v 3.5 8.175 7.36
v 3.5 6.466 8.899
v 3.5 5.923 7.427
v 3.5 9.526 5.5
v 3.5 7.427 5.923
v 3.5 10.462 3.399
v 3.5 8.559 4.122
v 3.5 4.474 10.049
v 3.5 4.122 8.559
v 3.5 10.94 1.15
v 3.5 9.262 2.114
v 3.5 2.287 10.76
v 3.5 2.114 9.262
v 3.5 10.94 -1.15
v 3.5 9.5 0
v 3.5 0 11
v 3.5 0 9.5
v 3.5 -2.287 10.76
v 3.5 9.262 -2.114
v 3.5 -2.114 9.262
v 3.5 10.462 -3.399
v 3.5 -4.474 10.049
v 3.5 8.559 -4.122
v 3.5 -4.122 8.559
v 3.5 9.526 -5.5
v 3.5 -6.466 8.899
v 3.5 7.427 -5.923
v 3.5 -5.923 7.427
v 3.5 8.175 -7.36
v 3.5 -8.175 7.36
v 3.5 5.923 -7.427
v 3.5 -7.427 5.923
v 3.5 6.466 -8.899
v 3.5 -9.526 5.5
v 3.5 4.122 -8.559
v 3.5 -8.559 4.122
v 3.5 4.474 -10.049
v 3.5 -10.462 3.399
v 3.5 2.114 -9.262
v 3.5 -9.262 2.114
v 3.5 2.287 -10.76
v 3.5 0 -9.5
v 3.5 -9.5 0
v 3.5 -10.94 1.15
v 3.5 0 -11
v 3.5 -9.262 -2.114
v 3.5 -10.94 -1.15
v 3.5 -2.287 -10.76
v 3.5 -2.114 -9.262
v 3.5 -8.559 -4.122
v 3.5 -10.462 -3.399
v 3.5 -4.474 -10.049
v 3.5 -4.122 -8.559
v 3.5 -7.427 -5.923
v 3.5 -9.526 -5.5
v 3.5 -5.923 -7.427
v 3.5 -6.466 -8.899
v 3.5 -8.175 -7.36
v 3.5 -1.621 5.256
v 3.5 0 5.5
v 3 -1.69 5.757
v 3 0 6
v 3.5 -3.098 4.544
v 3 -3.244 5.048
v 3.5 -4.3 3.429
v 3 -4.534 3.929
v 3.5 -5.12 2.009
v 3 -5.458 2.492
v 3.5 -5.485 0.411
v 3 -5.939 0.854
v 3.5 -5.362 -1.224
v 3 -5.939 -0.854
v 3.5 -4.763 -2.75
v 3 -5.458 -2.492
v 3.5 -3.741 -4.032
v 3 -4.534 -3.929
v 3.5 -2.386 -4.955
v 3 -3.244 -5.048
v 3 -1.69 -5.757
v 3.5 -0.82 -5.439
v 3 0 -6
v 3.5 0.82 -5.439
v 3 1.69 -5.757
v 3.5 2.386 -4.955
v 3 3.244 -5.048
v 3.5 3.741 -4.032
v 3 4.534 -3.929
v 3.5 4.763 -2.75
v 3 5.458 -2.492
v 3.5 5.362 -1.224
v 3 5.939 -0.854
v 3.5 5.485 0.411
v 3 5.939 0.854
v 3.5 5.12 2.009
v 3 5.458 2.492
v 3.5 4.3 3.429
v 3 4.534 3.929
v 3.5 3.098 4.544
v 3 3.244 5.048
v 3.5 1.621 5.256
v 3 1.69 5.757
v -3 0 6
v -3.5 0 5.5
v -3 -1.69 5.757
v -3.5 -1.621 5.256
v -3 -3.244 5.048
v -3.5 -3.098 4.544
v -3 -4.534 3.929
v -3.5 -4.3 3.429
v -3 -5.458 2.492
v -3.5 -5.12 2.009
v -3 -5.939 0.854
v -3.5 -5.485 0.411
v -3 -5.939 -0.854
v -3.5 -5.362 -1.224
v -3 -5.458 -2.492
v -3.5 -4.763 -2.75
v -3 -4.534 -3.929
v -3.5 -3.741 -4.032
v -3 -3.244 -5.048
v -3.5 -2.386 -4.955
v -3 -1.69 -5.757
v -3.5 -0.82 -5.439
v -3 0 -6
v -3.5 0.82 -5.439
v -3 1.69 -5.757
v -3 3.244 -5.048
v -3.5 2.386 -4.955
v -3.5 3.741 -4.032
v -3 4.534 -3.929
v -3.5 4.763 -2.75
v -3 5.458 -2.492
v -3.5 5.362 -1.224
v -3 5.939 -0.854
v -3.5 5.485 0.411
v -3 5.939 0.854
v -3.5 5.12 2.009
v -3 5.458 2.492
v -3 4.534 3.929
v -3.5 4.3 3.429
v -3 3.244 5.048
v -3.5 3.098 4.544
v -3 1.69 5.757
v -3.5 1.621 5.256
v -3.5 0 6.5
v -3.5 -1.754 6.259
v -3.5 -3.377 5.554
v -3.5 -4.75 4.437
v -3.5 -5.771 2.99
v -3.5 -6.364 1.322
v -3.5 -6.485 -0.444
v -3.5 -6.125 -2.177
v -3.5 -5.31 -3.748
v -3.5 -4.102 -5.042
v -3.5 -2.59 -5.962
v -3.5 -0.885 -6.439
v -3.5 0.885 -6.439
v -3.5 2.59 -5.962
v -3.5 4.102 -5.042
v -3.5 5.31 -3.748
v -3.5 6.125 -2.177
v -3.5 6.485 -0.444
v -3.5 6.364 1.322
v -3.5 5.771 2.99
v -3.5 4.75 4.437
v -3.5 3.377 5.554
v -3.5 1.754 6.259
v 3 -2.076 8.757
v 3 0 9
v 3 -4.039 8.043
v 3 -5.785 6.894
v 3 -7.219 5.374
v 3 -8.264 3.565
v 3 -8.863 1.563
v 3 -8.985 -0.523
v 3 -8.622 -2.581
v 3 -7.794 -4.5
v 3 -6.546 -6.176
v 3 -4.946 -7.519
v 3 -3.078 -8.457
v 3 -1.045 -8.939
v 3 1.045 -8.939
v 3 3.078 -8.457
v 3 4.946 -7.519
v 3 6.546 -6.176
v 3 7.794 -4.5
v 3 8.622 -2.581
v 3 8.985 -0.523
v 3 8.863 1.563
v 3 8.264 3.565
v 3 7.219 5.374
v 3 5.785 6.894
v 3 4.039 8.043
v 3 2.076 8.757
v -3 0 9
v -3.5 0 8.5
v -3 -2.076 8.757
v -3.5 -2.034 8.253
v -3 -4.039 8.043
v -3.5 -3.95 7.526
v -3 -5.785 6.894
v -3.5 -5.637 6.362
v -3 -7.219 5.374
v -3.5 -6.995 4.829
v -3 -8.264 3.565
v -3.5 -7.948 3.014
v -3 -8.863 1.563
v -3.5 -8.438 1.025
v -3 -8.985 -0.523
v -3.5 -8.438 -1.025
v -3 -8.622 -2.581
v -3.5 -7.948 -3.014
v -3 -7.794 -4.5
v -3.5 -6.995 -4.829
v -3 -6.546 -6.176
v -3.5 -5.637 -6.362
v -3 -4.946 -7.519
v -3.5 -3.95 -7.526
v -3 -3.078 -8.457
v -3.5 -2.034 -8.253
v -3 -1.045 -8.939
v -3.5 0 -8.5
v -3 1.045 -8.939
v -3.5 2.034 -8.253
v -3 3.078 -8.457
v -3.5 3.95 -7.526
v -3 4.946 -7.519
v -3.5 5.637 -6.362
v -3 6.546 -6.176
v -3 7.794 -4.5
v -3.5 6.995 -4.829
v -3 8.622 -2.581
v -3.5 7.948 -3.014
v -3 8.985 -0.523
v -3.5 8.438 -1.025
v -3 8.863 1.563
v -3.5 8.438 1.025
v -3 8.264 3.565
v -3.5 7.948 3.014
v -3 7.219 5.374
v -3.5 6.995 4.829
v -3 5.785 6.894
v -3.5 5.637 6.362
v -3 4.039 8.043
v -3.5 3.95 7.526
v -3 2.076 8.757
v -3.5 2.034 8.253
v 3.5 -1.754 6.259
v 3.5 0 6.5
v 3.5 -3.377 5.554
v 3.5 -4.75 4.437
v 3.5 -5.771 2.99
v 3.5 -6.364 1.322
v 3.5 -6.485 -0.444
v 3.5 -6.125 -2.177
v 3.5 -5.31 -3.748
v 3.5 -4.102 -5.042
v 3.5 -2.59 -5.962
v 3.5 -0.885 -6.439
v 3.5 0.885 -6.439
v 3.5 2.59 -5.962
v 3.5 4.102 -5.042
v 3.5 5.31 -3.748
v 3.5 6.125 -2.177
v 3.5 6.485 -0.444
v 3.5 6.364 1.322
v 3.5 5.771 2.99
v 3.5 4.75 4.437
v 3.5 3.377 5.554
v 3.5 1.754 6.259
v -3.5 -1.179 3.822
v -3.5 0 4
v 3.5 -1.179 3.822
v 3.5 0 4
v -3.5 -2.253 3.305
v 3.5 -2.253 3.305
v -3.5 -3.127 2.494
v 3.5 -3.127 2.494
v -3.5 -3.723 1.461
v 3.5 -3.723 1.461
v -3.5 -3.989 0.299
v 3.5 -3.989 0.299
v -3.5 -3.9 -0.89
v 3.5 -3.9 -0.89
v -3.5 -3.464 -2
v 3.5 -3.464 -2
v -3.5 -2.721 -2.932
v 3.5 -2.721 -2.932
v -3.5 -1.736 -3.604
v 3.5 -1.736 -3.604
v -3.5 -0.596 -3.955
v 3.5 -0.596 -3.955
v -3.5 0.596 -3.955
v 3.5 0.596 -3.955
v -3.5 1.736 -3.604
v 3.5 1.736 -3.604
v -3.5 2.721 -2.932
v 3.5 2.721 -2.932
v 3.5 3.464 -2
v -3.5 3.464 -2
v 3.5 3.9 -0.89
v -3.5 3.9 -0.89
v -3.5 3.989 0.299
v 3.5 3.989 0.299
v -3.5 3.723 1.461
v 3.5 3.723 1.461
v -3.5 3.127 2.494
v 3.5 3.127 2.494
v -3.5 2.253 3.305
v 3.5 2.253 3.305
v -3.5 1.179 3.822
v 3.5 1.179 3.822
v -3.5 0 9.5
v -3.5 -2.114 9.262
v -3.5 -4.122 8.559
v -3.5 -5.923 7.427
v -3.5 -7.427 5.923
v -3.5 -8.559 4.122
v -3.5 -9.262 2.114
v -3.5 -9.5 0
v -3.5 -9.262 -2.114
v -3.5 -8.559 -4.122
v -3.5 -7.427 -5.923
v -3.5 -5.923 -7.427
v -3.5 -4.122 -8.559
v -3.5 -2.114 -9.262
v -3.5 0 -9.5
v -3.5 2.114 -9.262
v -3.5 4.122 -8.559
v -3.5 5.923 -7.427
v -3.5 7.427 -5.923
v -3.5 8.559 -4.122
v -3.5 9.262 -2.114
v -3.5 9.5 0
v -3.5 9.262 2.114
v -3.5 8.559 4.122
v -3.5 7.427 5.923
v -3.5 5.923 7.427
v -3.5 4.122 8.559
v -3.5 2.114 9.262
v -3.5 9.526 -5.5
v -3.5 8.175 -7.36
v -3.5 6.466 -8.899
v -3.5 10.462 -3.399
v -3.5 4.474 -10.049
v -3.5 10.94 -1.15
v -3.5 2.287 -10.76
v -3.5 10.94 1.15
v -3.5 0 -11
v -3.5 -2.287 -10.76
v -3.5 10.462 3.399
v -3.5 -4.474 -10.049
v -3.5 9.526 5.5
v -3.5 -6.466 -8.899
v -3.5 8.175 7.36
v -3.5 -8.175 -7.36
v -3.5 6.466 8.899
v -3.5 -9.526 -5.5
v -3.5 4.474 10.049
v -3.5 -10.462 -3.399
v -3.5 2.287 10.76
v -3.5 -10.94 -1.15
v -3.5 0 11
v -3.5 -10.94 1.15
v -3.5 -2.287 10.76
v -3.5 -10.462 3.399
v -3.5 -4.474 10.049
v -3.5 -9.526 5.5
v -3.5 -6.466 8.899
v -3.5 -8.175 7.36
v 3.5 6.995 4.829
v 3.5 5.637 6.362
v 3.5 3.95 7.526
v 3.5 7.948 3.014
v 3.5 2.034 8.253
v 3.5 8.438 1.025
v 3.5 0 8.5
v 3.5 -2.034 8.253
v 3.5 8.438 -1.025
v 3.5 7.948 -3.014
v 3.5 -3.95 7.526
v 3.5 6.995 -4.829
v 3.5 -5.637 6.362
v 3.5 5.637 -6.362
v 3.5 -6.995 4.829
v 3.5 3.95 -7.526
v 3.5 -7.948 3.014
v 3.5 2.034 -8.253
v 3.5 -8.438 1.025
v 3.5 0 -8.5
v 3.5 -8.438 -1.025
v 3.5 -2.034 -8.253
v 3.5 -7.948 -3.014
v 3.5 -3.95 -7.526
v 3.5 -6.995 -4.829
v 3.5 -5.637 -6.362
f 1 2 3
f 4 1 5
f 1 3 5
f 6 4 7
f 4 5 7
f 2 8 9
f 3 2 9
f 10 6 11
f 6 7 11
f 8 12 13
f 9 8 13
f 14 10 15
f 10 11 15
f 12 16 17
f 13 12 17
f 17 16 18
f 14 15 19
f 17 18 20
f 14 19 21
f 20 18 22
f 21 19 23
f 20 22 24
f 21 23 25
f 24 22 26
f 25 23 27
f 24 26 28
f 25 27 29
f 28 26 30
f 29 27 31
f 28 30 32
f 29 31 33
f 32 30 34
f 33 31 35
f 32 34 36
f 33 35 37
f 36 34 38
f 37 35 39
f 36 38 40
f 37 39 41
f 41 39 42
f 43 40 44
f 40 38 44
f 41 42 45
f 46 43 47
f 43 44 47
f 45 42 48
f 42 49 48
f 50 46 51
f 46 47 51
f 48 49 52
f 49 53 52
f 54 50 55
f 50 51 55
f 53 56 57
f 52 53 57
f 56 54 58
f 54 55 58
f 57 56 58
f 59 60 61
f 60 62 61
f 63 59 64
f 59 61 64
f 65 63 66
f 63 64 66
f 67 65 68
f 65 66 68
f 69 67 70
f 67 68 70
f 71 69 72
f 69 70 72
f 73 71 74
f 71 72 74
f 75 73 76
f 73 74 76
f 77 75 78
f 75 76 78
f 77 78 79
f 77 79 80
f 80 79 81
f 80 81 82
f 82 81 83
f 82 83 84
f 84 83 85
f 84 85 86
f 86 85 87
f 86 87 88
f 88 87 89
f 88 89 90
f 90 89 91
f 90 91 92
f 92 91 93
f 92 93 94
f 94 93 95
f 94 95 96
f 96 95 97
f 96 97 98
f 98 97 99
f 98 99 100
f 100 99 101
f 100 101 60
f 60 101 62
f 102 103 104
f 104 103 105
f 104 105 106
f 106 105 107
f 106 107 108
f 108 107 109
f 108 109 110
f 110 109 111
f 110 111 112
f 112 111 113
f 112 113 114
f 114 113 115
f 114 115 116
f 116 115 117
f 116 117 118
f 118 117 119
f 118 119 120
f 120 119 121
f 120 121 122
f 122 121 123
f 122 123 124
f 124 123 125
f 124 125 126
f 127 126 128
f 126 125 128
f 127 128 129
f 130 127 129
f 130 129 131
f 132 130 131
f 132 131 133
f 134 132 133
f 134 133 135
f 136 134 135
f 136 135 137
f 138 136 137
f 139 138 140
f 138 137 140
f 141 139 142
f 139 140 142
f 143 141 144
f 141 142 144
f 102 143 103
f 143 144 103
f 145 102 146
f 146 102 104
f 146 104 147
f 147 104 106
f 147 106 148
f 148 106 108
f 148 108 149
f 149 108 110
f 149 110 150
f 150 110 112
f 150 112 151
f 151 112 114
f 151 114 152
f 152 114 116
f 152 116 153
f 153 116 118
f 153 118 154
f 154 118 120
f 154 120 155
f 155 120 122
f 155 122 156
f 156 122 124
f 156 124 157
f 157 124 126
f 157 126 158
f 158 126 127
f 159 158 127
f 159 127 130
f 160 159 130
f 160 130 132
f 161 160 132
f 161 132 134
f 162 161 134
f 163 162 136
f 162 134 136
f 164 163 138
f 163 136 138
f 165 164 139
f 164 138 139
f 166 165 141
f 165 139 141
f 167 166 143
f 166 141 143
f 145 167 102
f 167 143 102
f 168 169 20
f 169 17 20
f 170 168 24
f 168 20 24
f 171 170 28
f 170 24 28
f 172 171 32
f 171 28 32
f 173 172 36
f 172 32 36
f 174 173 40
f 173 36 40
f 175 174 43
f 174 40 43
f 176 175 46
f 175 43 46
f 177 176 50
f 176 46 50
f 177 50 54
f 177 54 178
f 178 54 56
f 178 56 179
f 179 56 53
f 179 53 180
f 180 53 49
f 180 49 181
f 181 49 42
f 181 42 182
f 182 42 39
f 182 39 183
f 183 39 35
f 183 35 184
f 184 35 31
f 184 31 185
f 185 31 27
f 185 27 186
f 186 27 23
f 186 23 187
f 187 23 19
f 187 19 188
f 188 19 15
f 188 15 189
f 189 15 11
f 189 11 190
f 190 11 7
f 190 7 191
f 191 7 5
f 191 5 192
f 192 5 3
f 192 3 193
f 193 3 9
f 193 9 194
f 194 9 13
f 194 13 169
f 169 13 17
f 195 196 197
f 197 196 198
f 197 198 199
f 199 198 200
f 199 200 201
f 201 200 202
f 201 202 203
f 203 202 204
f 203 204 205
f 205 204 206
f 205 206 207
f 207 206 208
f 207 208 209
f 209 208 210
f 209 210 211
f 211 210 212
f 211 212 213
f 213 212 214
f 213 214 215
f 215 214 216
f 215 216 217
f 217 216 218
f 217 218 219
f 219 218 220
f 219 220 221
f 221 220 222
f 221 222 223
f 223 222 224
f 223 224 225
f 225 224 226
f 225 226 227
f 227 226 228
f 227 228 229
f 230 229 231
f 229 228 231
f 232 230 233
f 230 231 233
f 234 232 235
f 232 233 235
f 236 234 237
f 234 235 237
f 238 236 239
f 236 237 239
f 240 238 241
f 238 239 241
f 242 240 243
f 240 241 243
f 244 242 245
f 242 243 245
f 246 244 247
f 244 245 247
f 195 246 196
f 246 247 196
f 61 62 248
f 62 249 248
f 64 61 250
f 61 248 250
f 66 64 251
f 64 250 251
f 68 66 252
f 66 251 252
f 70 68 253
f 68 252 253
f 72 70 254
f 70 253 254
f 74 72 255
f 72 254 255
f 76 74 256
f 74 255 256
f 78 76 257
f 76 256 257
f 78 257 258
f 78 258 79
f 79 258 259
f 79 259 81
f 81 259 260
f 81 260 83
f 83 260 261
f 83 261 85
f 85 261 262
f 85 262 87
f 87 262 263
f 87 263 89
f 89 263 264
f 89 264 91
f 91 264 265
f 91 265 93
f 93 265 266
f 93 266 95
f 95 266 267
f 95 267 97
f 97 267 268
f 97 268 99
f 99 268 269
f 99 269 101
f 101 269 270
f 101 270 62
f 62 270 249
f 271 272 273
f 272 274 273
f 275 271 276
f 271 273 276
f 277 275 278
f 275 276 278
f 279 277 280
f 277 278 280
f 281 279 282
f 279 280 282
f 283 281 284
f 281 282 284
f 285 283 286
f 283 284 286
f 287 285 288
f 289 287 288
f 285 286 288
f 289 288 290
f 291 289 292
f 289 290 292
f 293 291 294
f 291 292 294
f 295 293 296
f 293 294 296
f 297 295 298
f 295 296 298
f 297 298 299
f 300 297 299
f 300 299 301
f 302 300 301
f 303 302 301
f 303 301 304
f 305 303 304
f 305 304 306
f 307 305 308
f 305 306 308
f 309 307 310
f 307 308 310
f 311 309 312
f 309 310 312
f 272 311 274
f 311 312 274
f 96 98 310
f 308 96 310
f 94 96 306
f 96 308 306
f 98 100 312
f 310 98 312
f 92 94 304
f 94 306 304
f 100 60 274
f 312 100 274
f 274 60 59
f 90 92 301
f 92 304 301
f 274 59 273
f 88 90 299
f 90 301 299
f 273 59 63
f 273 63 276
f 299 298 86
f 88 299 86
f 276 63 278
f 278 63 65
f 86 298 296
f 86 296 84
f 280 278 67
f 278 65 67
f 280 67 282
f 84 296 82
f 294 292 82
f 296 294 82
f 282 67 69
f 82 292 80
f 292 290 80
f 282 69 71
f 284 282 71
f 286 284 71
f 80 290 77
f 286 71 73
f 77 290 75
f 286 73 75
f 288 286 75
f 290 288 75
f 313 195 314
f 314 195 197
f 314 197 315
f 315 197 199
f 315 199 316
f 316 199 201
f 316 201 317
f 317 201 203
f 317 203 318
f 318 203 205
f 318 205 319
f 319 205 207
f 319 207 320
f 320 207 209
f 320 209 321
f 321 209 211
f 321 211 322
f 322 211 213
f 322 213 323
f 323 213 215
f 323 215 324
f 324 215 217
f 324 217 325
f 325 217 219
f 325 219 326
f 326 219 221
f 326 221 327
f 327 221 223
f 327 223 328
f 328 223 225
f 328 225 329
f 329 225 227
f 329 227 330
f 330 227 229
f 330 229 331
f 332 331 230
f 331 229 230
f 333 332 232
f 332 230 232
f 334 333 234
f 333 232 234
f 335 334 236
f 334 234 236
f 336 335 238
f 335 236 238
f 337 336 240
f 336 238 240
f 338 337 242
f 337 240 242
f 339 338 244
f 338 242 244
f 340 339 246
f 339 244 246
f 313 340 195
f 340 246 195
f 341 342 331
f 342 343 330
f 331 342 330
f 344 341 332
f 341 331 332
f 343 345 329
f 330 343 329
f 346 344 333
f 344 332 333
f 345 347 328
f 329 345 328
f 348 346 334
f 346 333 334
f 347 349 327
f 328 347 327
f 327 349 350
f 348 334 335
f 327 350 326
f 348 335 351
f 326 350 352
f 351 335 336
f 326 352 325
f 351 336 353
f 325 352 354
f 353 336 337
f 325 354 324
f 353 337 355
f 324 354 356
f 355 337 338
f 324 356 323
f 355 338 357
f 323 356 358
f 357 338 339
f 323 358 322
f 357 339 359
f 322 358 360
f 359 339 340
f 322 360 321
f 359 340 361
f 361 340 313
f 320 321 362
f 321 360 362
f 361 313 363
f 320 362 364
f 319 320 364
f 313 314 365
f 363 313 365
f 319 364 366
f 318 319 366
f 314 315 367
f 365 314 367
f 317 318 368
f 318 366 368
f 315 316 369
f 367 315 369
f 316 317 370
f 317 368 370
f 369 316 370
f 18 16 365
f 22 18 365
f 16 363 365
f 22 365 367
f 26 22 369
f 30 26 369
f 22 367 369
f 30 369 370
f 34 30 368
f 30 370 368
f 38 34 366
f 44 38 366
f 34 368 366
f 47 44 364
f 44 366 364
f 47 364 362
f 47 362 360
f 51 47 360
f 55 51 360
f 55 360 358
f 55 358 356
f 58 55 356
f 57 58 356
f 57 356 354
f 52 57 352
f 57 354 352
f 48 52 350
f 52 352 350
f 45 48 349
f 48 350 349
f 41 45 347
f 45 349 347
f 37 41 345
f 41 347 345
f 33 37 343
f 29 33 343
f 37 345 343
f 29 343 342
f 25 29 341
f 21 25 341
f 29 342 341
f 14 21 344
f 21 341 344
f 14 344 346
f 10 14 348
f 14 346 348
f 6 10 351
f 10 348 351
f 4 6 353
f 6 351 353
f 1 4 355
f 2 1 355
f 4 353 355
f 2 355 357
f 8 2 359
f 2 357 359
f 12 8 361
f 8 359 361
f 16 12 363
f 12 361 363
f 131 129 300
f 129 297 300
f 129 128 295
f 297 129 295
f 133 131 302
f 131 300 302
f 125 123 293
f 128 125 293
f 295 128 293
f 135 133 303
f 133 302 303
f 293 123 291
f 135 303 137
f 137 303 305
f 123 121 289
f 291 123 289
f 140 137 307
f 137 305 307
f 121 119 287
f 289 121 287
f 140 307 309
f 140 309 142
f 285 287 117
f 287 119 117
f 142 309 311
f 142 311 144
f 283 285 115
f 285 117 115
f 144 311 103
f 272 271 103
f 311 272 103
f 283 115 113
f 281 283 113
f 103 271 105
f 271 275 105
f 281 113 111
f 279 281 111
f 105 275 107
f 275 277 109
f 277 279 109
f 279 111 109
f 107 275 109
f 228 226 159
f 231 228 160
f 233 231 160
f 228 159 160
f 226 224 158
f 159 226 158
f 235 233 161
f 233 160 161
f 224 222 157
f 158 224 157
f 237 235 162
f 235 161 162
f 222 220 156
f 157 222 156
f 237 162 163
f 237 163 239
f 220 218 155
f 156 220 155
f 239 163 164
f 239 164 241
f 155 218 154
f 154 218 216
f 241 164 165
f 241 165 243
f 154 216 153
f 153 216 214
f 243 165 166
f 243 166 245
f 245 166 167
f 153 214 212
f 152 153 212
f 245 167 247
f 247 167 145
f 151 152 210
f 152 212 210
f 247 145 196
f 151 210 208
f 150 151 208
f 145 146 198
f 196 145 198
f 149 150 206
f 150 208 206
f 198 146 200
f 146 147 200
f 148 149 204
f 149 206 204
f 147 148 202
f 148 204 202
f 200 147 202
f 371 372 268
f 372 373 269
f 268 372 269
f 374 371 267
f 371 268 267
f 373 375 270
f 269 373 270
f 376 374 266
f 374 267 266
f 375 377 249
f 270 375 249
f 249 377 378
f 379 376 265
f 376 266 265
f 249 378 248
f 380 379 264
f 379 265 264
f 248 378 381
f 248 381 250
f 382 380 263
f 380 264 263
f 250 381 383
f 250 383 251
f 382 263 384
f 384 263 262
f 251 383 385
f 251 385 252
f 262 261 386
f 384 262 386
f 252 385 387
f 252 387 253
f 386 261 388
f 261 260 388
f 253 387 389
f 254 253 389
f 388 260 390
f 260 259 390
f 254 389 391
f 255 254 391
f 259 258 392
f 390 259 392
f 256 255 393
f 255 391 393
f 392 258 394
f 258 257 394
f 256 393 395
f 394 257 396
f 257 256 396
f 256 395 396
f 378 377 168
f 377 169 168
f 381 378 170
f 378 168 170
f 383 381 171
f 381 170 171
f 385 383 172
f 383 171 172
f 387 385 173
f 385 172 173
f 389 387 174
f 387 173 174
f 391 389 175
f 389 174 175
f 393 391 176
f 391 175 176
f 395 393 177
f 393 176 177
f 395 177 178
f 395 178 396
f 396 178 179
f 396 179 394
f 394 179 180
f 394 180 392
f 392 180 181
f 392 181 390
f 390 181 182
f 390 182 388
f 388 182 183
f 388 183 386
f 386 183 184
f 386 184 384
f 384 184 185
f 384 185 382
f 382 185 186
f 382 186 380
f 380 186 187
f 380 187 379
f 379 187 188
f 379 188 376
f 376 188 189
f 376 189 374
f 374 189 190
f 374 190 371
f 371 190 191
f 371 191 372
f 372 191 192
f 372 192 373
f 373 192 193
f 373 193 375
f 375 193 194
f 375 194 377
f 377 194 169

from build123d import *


with BuildPart() as part:
    # Esquisse1 → Base-Révolution (revolve)
    with BuildSketch(Plane.XY, mode=Mode.PRIVATE) as base_r_volution_sk:
        Polygon((-3.5, 4), (3.5, 4), (3.5, 5.5), (3, 6), (3.5, 6.5), (3.5, 8.5), (3, 9), (3.5, 9.5), (3.5, 11), (-3.5, 11), (-3.5, 9.5), (-3, 9), (-3.5, 8.5), (-3.5, 6.5), (-3, 6), (-3.5, 5.5), align=None)
    revolve(base_r_volution_sk.sketch.rotate(Axis((0, 0, 0), (1, 0, 0)), 90), axis=Axis((0, 0, 0), (1, 0, 0)))


solid = part.part
